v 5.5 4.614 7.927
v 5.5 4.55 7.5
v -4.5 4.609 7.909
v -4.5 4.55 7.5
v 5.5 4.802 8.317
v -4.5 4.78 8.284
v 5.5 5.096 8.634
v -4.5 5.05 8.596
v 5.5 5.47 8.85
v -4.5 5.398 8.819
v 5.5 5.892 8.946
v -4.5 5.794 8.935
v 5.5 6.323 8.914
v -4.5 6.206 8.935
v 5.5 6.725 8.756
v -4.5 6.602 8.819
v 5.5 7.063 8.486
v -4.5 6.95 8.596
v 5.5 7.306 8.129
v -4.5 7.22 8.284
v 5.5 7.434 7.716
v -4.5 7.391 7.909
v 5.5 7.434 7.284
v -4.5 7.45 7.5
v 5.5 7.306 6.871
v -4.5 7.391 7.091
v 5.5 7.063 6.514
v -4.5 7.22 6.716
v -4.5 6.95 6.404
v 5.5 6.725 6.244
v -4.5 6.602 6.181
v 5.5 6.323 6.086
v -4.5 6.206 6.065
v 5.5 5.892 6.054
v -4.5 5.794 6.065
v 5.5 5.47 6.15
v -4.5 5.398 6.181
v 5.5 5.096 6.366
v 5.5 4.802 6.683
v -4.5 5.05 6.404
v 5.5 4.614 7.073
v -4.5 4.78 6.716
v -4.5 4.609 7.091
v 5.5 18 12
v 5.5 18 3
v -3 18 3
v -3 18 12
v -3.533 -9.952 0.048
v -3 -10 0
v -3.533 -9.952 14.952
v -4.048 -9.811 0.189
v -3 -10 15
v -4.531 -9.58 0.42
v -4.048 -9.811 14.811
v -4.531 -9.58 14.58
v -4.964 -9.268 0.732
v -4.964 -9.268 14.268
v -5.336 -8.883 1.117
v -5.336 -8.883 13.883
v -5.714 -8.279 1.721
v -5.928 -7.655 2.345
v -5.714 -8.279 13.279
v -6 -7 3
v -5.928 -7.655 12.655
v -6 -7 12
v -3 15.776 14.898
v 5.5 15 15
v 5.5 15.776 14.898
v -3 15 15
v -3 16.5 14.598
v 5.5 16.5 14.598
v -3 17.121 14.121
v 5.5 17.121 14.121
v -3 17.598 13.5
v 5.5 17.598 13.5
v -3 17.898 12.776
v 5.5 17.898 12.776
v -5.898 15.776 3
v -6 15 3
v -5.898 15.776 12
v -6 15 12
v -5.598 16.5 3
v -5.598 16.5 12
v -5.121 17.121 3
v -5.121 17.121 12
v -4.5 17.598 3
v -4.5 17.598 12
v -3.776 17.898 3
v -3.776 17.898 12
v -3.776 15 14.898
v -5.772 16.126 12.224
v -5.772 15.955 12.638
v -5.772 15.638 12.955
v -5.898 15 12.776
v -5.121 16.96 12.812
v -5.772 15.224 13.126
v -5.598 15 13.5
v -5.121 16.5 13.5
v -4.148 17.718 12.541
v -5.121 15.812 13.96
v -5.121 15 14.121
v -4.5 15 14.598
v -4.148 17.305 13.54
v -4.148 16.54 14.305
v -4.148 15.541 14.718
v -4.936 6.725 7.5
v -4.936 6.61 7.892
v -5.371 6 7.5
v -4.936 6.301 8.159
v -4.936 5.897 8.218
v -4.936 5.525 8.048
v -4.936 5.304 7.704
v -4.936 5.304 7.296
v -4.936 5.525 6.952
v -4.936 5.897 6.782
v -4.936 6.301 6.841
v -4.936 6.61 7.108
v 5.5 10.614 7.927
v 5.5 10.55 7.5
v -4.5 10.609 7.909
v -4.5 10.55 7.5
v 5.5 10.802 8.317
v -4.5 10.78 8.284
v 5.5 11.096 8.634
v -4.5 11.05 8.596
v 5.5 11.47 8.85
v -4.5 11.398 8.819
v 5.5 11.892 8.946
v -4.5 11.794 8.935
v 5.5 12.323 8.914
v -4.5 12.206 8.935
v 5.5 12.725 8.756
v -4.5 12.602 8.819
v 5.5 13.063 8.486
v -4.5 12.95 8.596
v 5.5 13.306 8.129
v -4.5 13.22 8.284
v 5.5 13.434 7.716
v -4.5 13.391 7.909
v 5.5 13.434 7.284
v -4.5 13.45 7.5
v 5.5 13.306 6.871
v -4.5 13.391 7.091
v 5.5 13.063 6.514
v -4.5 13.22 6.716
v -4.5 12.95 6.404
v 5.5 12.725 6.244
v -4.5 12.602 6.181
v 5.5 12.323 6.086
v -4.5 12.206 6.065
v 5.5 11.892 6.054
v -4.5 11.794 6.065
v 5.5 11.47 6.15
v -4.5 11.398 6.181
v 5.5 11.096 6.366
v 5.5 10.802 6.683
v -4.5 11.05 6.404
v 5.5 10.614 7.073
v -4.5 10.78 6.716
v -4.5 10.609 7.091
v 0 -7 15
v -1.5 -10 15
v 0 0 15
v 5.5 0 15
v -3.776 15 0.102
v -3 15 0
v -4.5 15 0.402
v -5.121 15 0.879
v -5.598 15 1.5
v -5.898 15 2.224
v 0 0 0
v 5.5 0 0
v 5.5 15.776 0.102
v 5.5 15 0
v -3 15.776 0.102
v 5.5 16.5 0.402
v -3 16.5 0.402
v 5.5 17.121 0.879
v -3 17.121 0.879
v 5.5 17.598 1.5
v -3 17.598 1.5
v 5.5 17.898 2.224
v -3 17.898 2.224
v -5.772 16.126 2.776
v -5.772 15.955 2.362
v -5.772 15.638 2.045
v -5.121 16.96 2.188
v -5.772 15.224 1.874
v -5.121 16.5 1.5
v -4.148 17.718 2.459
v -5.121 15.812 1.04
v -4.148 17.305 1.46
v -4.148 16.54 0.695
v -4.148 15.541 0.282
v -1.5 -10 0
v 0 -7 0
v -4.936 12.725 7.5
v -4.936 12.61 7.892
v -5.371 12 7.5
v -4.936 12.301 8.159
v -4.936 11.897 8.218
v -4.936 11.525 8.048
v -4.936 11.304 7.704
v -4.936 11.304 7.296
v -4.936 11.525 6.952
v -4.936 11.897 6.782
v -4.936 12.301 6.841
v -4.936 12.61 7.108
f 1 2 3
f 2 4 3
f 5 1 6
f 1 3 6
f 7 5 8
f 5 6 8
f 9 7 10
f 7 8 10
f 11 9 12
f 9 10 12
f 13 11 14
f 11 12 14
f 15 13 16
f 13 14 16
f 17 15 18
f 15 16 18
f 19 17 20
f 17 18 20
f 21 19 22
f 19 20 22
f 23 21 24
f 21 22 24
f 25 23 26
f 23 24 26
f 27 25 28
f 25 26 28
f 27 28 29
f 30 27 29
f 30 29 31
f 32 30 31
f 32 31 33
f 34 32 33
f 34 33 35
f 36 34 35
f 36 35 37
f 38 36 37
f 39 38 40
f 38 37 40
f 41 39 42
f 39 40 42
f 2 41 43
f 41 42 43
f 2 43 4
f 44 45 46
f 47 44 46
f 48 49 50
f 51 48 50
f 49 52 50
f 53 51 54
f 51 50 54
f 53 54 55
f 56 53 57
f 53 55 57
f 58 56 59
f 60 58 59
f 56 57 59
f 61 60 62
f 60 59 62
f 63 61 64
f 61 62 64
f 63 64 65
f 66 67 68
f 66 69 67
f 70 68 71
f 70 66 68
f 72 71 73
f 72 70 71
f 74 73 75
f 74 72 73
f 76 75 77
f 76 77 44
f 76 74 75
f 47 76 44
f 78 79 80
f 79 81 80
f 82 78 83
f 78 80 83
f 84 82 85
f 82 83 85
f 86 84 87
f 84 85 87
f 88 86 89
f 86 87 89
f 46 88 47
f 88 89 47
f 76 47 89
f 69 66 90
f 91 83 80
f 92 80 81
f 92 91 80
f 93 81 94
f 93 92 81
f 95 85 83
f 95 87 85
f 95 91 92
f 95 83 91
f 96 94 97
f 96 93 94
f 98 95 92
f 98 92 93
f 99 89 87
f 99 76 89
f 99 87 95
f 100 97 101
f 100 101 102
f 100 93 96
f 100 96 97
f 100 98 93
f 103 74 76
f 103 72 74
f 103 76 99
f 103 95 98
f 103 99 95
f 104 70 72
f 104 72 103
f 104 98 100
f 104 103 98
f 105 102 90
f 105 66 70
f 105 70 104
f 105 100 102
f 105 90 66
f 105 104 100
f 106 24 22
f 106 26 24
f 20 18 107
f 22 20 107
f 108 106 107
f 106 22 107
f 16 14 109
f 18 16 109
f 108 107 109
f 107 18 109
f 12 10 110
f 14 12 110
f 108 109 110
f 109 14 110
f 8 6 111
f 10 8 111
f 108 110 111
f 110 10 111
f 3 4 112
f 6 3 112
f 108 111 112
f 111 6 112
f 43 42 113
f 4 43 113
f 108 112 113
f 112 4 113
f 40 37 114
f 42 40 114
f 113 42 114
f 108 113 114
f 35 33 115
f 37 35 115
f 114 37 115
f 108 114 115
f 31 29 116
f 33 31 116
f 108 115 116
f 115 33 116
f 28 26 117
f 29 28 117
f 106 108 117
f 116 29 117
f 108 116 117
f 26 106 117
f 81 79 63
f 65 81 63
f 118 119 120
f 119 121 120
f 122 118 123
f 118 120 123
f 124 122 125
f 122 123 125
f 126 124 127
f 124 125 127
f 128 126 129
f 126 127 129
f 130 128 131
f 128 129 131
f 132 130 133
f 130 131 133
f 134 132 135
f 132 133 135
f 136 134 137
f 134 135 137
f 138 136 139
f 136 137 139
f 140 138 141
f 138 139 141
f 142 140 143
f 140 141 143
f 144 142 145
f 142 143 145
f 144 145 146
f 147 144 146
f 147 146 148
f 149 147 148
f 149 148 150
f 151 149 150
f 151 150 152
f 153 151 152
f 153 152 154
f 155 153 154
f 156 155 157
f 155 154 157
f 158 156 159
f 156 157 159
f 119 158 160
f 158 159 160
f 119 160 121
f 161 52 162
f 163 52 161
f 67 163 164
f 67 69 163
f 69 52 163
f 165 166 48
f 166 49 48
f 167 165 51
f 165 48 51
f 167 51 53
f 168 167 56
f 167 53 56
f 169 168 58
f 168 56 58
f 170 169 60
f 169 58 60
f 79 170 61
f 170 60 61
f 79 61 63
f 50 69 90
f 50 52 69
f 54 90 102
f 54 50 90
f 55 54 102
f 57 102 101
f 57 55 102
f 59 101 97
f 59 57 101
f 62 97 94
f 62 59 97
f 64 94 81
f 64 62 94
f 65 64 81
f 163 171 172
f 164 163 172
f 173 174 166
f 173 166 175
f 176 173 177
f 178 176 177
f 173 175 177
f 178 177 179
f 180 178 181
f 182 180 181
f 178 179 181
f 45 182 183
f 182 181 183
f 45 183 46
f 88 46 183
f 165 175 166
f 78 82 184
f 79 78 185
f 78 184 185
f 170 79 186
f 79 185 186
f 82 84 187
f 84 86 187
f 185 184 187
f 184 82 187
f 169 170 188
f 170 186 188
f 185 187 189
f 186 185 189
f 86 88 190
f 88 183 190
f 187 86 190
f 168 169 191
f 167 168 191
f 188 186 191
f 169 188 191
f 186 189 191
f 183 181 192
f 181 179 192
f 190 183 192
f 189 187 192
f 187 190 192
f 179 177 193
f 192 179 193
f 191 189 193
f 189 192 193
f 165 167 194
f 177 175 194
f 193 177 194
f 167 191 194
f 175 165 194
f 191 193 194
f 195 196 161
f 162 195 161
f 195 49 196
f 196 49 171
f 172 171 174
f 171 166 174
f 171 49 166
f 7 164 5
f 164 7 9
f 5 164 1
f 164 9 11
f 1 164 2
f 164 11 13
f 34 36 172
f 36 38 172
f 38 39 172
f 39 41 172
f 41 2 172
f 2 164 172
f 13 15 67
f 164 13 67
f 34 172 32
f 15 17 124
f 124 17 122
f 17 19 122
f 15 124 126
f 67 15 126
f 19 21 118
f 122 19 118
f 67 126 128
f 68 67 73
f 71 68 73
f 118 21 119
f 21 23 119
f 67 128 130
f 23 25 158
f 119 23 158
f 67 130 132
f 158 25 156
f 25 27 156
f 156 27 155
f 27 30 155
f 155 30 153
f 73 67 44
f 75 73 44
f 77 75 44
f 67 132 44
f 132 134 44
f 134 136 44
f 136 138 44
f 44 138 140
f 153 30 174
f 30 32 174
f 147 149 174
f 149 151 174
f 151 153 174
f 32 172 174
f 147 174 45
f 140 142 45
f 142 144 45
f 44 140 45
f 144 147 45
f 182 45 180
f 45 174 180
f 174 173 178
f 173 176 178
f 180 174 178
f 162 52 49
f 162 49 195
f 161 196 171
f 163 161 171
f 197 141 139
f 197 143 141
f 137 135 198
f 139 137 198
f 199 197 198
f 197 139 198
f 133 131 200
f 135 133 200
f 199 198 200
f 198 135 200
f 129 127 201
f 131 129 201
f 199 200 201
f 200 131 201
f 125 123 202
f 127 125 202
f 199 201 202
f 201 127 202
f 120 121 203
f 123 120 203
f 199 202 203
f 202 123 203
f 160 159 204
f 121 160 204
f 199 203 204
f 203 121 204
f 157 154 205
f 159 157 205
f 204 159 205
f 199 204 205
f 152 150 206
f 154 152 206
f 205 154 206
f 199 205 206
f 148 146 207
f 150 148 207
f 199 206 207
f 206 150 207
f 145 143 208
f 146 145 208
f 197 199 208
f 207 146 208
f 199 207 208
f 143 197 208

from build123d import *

# Parameters (mm, degrees)
F1_DEPTH = 15
F3_D     = 2.9
F3_DEPTH = 10
F3_TIP   = 0.8712478976
F4_SIZE2 = 3
F4_SIZE  = 1.5
F5_R     = 3


with BuildPart() as f1:
    # F0 (on Top) → F1 (new body)
    with BuildSketch(Plane.XY):
        Polygon((0, 0), (5.5, 0), (5.5, 18), (-6, 18), (-6, -10), (0, -10), align=None)
    extrude(amount=F1_DEPTH)

    # F3
    with Locations(Plane.YZ.offset(5.5)):
        with Locations((6, 7.5), (12, 7.5)):
            Hole(F3_D / 2, depth=F3_DEPTH)
            with Locations((0, 0, -(F3_DEPTH + F3_TIP / 2))):  # 118° drill point
                Cone(0, F3_D / 2, F3_TIP, mode=Mode.SUBTRACT)

    # F4
    f4_edges = [f1.edges().sort_by_distance(p)[0] for p in [
        (0, -10, 7.5),
    ]]
    f4_side = f1.faces().sort_by_distance((-3, -10, 7.5))[0]
    chamfer(f4_edges, length=F4_SIZE, length2=F4_SIZE2, reference=f4_side)

    # F5
    f5_edges = [f1.edges().sort_by_distance(p)[0] for p in [
        (-0.25, 18, 15),
        (-0.25, 18, 0),
        (-6, 18, 7.5),
        (-6, 4, 0),
        (-6, 4, 15),
        (-6, -10, 7.5),
    ]]
    fillet(f5_edges, radius=F5_R)


solid = f1.part
